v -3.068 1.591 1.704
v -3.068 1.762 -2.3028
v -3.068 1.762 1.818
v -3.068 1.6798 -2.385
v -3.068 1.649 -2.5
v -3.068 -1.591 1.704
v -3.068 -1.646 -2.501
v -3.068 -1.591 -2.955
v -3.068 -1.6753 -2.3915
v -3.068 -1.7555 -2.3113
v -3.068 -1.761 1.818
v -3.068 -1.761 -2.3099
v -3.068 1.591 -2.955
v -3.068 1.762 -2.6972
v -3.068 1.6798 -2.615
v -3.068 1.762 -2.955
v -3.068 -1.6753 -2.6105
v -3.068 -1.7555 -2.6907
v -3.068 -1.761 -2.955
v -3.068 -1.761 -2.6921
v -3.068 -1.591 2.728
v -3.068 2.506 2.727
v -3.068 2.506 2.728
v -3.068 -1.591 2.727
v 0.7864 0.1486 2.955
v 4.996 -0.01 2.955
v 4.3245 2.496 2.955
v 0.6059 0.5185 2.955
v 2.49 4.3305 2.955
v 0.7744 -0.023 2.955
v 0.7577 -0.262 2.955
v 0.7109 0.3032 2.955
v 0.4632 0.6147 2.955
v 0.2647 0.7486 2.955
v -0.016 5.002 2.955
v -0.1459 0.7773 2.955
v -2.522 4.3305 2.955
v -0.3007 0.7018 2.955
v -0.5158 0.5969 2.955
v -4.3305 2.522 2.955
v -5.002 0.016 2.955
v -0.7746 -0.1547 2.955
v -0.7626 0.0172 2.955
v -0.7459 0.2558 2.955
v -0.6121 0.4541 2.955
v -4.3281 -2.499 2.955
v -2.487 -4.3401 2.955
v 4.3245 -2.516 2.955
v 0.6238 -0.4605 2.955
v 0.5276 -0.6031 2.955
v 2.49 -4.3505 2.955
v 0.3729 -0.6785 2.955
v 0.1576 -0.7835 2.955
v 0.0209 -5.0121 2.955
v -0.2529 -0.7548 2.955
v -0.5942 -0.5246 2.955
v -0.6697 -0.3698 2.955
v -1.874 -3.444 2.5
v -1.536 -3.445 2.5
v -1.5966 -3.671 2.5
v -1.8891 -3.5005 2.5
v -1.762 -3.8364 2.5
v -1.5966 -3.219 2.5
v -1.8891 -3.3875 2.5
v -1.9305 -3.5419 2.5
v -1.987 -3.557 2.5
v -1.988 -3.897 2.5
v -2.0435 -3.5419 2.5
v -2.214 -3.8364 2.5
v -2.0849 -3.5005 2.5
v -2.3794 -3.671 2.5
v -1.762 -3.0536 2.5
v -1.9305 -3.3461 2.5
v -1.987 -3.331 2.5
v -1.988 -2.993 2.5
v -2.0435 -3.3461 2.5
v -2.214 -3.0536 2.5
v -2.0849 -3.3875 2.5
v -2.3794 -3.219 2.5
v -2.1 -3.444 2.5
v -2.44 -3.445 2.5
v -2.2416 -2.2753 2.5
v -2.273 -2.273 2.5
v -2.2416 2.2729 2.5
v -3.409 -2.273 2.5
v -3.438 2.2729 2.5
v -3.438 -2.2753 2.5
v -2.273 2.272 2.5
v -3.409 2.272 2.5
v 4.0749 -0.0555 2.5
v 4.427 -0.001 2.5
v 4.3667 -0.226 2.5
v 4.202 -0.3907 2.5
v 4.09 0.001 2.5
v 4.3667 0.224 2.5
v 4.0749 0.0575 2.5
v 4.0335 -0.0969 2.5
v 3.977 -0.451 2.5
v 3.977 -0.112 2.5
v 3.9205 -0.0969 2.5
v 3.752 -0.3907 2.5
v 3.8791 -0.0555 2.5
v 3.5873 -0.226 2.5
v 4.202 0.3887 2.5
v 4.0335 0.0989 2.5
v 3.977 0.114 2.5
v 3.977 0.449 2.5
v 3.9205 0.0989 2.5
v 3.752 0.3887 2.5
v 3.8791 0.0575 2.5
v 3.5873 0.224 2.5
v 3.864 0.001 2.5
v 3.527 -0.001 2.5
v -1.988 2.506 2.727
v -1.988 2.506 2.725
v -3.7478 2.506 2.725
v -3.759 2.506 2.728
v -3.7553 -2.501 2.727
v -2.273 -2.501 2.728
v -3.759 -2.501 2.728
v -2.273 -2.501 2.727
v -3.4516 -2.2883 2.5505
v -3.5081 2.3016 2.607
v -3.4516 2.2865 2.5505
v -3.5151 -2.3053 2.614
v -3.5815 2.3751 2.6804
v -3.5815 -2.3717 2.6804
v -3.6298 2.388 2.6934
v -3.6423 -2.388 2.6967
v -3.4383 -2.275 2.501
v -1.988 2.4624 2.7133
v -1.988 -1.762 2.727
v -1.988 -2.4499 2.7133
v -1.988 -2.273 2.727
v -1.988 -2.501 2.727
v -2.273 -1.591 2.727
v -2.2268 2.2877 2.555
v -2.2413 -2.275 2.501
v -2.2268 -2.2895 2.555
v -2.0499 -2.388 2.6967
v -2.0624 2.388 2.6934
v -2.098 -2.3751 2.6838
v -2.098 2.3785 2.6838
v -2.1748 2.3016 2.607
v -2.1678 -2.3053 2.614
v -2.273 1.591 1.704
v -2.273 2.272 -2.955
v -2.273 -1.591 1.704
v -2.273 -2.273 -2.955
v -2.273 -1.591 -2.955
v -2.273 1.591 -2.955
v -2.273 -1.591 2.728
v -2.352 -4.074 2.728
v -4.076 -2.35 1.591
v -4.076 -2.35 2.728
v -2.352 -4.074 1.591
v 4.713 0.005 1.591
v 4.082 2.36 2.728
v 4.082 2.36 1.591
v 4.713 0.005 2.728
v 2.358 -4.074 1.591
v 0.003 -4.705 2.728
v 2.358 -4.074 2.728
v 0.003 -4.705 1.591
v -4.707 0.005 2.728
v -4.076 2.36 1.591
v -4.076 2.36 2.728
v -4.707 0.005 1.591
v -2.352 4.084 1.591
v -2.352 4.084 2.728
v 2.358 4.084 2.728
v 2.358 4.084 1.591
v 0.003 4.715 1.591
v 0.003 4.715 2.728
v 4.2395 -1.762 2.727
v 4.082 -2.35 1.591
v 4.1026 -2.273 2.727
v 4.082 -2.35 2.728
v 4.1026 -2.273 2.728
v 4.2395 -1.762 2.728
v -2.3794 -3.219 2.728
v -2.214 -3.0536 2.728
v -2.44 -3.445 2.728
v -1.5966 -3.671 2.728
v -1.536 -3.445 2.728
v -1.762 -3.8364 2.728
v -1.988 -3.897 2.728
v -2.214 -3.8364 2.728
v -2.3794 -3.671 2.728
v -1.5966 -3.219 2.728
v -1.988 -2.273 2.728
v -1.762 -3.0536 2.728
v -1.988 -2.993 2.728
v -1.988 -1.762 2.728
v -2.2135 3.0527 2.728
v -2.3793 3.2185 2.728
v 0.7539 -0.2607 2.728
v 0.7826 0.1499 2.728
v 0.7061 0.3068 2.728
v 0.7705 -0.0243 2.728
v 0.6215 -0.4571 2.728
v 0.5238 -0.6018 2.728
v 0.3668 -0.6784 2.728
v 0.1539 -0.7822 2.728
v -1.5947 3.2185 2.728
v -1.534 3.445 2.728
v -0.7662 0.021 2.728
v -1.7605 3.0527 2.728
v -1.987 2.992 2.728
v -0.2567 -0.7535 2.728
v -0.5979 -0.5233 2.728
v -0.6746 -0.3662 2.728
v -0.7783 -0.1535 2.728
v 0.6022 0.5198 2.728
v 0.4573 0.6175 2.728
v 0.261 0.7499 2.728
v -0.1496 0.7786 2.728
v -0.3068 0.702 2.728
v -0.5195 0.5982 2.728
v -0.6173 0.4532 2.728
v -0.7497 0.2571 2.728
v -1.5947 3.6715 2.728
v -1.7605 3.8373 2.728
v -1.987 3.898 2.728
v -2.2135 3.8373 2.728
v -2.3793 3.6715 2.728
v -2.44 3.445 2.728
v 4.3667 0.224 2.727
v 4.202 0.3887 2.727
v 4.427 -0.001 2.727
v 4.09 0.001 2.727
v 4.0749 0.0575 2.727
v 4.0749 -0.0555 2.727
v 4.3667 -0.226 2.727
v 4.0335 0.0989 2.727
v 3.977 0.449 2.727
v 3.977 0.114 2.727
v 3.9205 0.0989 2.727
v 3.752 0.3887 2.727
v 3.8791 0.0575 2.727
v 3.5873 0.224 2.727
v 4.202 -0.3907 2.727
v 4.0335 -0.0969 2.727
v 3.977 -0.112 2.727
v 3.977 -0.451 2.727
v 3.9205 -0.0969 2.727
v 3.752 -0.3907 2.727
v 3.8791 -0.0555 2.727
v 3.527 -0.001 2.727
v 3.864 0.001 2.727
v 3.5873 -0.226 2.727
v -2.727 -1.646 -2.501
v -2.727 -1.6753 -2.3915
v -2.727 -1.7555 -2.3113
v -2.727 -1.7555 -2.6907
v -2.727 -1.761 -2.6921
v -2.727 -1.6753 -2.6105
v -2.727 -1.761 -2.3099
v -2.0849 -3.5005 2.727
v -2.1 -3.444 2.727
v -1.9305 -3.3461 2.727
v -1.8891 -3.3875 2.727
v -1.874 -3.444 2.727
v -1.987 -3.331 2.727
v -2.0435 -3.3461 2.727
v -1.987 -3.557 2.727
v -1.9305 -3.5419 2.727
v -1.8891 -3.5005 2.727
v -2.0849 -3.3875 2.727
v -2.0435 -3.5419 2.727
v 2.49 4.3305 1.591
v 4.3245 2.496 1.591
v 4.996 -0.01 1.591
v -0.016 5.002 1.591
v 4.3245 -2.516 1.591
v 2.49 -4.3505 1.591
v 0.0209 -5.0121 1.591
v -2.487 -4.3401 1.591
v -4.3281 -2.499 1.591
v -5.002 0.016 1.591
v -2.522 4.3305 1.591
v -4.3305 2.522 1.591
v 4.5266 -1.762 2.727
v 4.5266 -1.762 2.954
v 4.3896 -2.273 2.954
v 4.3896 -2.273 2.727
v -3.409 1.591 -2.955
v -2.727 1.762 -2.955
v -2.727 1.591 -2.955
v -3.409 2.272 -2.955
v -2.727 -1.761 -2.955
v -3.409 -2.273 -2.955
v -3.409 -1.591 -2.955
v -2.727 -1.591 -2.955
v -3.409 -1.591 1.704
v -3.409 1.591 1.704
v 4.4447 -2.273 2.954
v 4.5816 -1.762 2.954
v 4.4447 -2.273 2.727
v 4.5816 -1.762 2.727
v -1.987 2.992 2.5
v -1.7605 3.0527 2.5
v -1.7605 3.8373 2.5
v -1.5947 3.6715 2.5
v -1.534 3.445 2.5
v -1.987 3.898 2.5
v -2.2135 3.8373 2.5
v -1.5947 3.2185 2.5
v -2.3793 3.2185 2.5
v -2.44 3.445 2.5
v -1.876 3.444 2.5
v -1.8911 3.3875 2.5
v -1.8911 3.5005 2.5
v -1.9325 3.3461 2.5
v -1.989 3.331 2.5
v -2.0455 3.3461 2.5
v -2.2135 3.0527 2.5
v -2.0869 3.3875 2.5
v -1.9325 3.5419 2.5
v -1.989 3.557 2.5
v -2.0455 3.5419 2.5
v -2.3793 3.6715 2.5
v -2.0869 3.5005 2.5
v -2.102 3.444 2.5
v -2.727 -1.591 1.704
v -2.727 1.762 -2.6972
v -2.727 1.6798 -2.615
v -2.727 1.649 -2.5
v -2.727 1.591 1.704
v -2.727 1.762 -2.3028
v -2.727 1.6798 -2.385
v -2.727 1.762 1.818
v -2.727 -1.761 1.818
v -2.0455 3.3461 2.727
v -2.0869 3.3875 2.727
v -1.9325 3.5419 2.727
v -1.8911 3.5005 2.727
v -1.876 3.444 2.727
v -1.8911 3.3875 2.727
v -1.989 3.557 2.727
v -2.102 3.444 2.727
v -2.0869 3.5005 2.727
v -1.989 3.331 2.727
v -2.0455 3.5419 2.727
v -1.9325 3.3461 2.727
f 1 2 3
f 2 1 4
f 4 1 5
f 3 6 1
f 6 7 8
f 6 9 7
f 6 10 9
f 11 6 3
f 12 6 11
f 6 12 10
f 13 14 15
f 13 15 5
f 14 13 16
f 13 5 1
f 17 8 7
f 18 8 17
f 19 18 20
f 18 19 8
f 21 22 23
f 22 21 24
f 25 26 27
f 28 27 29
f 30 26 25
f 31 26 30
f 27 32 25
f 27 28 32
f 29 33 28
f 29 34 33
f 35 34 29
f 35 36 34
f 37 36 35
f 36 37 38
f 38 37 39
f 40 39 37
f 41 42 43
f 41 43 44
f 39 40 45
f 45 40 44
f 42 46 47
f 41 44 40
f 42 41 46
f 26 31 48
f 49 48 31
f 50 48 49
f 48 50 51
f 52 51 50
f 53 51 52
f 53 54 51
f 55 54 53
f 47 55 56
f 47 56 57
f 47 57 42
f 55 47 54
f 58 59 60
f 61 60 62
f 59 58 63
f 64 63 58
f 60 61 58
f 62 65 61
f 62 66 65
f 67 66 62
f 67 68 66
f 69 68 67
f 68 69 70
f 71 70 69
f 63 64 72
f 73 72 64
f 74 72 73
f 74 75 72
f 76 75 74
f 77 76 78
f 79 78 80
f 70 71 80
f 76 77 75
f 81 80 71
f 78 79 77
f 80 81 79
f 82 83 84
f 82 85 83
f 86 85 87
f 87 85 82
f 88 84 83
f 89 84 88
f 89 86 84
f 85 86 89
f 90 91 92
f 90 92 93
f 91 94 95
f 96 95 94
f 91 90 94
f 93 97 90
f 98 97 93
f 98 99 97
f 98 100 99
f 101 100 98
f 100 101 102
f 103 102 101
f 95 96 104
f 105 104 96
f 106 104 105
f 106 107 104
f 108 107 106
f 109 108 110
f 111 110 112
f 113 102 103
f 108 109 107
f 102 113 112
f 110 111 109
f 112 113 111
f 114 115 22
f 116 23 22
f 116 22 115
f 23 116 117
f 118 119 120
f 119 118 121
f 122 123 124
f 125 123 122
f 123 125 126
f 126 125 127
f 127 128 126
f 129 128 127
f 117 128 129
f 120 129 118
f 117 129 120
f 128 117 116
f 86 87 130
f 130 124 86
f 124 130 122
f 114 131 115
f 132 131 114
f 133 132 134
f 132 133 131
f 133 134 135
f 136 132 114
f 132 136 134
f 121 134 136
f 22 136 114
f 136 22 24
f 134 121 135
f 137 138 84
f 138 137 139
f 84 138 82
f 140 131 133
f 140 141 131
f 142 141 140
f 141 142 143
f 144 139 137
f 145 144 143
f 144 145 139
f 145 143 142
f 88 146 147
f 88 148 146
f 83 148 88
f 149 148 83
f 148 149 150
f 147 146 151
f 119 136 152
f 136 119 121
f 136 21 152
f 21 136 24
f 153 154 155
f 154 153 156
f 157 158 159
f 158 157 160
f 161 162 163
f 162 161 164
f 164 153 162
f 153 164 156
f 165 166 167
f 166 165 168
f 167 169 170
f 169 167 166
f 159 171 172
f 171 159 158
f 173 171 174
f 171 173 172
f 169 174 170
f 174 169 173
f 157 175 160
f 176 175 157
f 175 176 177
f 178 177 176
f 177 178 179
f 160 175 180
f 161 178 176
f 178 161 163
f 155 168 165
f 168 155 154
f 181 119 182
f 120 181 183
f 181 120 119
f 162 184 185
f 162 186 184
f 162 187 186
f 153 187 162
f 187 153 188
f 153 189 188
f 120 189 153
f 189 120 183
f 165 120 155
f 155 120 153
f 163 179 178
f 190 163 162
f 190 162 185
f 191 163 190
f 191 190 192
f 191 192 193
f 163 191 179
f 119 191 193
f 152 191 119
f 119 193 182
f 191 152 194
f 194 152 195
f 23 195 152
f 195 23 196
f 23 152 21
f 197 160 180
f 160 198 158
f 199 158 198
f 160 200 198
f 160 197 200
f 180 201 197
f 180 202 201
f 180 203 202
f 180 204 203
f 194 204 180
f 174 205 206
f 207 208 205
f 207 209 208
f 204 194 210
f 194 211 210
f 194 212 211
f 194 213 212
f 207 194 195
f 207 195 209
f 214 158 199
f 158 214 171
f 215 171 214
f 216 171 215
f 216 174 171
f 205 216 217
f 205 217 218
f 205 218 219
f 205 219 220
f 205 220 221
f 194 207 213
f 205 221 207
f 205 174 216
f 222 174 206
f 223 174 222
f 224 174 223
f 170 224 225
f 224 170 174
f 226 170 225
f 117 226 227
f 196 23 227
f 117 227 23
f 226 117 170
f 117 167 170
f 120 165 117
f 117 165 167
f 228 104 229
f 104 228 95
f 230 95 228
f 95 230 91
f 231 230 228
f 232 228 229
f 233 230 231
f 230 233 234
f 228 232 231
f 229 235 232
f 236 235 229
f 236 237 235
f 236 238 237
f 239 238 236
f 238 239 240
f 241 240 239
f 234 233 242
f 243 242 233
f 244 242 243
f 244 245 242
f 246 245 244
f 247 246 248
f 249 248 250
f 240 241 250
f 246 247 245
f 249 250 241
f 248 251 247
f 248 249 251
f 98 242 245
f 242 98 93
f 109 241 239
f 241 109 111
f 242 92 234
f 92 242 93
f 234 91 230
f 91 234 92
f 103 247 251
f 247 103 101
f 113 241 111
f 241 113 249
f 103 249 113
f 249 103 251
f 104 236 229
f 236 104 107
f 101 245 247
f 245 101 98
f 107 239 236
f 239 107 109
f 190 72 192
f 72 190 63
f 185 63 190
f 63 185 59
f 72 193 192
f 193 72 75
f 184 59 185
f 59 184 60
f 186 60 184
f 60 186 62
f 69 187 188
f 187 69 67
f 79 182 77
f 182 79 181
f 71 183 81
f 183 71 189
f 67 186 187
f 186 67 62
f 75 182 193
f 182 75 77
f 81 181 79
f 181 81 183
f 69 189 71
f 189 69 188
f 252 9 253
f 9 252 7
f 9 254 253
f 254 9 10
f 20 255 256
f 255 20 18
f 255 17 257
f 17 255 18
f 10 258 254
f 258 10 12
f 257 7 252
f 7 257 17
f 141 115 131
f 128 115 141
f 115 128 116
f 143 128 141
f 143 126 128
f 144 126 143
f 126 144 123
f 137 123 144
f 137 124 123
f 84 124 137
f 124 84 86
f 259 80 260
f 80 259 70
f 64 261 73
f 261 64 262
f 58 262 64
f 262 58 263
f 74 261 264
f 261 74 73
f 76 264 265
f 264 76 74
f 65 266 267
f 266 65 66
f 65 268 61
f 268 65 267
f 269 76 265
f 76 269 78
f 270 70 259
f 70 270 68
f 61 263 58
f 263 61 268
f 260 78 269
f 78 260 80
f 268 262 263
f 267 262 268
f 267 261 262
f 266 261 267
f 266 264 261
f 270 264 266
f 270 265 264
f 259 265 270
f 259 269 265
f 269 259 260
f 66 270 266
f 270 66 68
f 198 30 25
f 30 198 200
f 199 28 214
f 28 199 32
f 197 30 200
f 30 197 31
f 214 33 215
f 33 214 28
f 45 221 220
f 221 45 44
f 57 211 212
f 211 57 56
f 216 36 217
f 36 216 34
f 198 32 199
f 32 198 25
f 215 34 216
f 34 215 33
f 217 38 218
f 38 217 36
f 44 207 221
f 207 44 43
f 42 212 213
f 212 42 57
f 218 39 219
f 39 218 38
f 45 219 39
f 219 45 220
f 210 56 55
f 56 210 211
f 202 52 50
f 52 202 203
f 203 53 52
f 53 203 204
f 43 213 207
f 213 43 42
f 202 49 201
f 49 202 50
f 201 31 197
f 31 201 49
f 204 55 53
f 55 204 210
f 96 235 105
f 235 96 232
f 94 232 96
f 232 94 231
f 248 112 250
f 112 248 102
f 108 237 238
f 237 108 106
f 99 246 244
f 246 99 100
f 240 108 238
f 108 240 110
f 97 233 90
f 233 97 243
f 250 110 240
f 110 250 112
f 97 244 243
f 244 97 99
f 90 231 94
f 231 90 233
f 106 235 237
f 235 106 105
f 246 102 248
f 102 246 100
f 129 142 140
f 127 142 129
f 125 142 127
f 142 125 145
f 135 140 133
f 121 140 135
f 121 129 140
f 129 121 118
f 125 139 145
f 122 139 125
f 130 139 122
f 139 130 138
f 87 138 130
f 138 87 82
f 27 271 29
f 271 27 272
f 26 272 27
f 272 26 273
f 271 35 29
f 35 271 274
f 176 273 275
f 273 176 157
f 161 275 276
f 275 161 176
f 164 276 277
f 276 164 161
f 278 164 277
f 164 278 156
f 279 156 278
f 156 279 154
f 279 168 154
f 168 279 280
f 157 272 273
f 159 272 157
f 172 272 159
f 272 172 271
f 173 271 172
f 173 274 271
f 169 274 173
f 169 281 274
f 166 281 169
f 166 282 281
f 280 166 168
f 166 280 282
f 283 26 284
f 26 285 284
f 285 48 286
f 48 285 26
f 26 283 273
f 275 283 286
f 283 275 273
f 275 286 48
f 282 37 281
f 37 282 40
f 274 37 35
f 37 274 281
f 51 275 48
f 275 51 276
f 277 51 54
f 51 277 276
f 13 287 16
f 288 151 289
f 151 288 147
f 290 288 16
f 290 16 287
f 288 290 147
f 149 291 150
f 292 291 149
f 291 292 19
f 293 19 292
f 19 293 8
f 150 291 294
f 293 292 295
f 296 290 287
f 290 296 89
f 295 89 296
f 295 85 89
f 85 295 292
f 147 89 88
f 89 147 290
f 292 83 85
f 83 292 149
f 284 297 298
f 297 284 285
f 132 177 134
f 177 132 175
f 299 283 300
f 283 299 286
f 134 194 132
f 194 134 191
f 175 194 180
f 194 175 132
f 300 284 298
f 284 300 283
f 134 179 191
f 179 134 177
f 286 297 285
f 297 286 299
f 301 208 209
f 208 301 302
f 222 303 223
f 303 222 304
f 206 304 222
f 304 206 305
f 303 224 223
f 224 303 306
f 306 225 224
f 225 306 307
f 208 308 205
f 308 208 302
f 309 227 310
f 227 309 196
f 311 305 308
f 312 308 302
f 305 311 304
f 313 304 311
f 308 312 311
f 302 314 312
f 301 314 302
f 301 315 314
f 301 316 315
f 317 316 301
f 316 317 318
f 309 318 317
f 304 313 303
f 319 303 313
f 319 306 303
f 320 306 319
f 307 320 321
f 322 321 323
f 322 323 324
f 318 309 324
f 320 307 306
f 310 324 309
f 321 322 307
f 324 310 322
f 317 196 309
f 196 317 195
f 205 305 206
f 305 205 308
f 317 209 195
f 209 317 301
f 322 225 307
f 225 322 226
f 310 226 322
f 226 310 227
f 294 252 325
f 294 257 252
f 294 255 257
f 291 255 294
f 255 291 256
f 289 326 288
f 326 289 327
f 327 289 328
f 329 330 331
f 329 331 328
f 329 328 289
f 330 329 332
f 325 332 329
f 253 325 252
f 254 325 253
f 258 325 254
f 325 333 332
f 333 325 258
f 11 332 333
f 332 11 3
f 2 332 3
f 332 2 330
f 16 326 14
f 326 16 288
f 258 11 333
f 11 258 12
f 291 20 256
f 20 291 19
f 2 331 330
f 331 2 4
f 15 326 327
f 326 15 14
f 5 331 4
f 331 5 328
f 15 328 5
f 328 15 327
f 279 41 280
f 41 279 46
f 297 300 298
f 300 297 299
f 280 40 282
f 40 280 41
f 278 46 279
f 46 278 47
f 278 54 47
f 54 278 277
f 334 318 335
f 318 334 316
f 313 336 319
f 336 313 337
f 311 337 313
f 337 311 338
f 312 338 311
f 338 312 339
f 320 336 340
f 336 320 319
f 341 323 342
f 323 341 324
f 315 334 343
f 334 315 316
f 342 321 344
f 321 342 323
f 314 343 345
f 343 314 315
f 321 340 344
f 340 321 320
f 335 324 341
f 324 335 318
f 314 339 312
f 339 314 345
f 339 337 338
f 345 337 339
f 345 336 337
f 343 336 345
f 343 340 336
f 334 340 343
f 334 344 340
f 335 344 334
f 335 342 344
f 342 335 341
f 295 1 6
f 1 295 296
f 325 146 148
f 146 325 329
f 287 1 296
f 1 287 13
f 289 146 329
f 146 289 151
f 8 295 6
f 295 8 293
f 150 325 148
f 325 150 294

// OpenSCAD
intersection() {
translate([-6, -5.998, -3.545]) cube(size = [12, 11.996, 7.091], center = false);
union() {
difference() {
union() {
translate([-3.068, -2.501, -2.955]) cube(size = [0.795, 0.91, 5.909], center = false);
difference() {
translate([-3.759, -2.501, 2.5]) cube(size = [0.691, 5.007, 0.455], center = false);
rotate([180, 90, -90])
translate([-2.373, 3.759, -18.1])
cylinder(h = 36.2, r1 = 0.355, r2 = 0.355, center = false, $fn = 12);
}
rotate([180, 0, 180])
translate([-0.003, 0.005, -2.955])
cylinder(h = 0.227, r1 = 4.71, r2 = 4.71, center = false, $fn = 12);
difference() {
translate([-3.068, -2.501, 2.5]) cube(size = [1.08, 5.007, 0.227], center = false);
rotate([180, 90, -90])
translate([-2.379, 1.922, -2.501])
cylinder(h = 5.007, r1 = 0.352, r2 = 0.352, center = false, $fn = 12);
}
translate([3.977, -0.001, -2.955])
cylinder(h = 5.682, r1 = 0.45, r2 = 0.45, center = false, $fn = 12);
translate([-1.988, -3.445, 2.5])
cylinder(h = 0.455, r1 = 0.452, r2 = 0.452, center = false, $fn = 12);
}
union() {
difference() {
rotate([180, 0, 180])
translate([-0.003, 0.005, -2.5])
cylinder(h = 20.6, r1 = 4.71, r2 = 4.71, center = false, $fn = 12);
rotate([180, 90, 180])
translate([2.501, -1.865, -18.1])
cylinder(h = 15.827, r1 = 0.219, r2 = 0.219, center = false, $fn = 12);
}
rotate([180, 0, 180])
translate([-0.003, 0.005, 2.955])
cylinder(h = 15.145, r1 = 4.71, r2 = 4.71, center = false, $fn = 12);
rotate([180, 90, 180])
translate([-2.489, 2.506, -18.1])
cylinder(h = 16.112, r1 = 0.236, r2 = 0.236, center = false, $fn = 12);
translate([-1.987, -3.444, -18.1])
cylinder(h = 20.827, r1 = 0.113, r2 = 0.113, center = false, $fn = 12);
rotate([0, 1, -19])
translate([-0.045, -0.001, -18.1])
cylinder(h = 36.2, r1 = 0.795, r2 = 0.795, center = false, $fn = 12);
translate([3.977, 0.001, -18.1])
cylinder(h = 20.827, r1 = 0.113, r2 = 0.113, center = false, $fn = 12);
rotate([180, 90, 180])
translate([-2.501, -2.501, -3.759])
cylinder(h = 21.859, r1 = 0.226, r2 = 0.226, center = false, $fn = 12);
}
}
difference() {
union() {
translate([-3.409, -2.273, -2.955]) cube(size = [1.136, 4.545, 5.682], center = false);
translate([-1.988, -2.273, 2.727]) cube(size = [20.088, 0.511, 0.227], center = false);
intersection() {
difference() {
translate([0, 0, 0]) sphere(r = 54.3, $fn = 12);
translate([-1.988, -2.273, -18.1]) cube(size = [20.088, 3.864, 15.145], center = false);
}
difference() {
translate([-0.016, -0.01, 1.591])
cylinder(h = 1.364, r1 = 5.012, r2 = 5.012, center = false, $fn = 12);
rotate([180, 0, 180])
translate([-0.003, 0.005, -18.1])
cylinder(h = 16.509, r1 = 4.71, r2 = 4.71, center = false, $fn = 12);
}
}
translate([-1.987, 3.445, 2.5])
cylinder(h = 15.6, r1 = 0.453, r2 = 0.453, center = false, $fn = 12);
}
union() {
translate([-1.989, 3.444, 2.5])
cylinder(h = 0.227, r1 = 0.113, r2 = 0.113, center = false, $fn = 12);
translate([-3.759, -1.591, -2.955]) cube(size = [1.487, 3.182, 4.659], center = false);
difference() {
union() {
translate([-3.759, 2.273, 1.591]) cube(size = [1.032, 0.233, 1.136], center = false);
translate([-3.068, -1.761, -2.955]) cube(size = [0.341, 3.523, 4.773], center = false);
}
rotate([180, 90, 180])
translate([2.5, 1.879, -3.068])
cylinder(h = 0.341, r1 = 0.23, r2 = 0.23, center = false, $fn = 12);
}
difference() {
translate([0, 0, 0]) sphere(r = 54.3, $fn = 12);
translate([0.028, 0.016, -18.1])
cylinder(h = 21.055, r1 = 5.03, r2 = 5.03, center = false, $fn = 12);
}
}
}
}
}
